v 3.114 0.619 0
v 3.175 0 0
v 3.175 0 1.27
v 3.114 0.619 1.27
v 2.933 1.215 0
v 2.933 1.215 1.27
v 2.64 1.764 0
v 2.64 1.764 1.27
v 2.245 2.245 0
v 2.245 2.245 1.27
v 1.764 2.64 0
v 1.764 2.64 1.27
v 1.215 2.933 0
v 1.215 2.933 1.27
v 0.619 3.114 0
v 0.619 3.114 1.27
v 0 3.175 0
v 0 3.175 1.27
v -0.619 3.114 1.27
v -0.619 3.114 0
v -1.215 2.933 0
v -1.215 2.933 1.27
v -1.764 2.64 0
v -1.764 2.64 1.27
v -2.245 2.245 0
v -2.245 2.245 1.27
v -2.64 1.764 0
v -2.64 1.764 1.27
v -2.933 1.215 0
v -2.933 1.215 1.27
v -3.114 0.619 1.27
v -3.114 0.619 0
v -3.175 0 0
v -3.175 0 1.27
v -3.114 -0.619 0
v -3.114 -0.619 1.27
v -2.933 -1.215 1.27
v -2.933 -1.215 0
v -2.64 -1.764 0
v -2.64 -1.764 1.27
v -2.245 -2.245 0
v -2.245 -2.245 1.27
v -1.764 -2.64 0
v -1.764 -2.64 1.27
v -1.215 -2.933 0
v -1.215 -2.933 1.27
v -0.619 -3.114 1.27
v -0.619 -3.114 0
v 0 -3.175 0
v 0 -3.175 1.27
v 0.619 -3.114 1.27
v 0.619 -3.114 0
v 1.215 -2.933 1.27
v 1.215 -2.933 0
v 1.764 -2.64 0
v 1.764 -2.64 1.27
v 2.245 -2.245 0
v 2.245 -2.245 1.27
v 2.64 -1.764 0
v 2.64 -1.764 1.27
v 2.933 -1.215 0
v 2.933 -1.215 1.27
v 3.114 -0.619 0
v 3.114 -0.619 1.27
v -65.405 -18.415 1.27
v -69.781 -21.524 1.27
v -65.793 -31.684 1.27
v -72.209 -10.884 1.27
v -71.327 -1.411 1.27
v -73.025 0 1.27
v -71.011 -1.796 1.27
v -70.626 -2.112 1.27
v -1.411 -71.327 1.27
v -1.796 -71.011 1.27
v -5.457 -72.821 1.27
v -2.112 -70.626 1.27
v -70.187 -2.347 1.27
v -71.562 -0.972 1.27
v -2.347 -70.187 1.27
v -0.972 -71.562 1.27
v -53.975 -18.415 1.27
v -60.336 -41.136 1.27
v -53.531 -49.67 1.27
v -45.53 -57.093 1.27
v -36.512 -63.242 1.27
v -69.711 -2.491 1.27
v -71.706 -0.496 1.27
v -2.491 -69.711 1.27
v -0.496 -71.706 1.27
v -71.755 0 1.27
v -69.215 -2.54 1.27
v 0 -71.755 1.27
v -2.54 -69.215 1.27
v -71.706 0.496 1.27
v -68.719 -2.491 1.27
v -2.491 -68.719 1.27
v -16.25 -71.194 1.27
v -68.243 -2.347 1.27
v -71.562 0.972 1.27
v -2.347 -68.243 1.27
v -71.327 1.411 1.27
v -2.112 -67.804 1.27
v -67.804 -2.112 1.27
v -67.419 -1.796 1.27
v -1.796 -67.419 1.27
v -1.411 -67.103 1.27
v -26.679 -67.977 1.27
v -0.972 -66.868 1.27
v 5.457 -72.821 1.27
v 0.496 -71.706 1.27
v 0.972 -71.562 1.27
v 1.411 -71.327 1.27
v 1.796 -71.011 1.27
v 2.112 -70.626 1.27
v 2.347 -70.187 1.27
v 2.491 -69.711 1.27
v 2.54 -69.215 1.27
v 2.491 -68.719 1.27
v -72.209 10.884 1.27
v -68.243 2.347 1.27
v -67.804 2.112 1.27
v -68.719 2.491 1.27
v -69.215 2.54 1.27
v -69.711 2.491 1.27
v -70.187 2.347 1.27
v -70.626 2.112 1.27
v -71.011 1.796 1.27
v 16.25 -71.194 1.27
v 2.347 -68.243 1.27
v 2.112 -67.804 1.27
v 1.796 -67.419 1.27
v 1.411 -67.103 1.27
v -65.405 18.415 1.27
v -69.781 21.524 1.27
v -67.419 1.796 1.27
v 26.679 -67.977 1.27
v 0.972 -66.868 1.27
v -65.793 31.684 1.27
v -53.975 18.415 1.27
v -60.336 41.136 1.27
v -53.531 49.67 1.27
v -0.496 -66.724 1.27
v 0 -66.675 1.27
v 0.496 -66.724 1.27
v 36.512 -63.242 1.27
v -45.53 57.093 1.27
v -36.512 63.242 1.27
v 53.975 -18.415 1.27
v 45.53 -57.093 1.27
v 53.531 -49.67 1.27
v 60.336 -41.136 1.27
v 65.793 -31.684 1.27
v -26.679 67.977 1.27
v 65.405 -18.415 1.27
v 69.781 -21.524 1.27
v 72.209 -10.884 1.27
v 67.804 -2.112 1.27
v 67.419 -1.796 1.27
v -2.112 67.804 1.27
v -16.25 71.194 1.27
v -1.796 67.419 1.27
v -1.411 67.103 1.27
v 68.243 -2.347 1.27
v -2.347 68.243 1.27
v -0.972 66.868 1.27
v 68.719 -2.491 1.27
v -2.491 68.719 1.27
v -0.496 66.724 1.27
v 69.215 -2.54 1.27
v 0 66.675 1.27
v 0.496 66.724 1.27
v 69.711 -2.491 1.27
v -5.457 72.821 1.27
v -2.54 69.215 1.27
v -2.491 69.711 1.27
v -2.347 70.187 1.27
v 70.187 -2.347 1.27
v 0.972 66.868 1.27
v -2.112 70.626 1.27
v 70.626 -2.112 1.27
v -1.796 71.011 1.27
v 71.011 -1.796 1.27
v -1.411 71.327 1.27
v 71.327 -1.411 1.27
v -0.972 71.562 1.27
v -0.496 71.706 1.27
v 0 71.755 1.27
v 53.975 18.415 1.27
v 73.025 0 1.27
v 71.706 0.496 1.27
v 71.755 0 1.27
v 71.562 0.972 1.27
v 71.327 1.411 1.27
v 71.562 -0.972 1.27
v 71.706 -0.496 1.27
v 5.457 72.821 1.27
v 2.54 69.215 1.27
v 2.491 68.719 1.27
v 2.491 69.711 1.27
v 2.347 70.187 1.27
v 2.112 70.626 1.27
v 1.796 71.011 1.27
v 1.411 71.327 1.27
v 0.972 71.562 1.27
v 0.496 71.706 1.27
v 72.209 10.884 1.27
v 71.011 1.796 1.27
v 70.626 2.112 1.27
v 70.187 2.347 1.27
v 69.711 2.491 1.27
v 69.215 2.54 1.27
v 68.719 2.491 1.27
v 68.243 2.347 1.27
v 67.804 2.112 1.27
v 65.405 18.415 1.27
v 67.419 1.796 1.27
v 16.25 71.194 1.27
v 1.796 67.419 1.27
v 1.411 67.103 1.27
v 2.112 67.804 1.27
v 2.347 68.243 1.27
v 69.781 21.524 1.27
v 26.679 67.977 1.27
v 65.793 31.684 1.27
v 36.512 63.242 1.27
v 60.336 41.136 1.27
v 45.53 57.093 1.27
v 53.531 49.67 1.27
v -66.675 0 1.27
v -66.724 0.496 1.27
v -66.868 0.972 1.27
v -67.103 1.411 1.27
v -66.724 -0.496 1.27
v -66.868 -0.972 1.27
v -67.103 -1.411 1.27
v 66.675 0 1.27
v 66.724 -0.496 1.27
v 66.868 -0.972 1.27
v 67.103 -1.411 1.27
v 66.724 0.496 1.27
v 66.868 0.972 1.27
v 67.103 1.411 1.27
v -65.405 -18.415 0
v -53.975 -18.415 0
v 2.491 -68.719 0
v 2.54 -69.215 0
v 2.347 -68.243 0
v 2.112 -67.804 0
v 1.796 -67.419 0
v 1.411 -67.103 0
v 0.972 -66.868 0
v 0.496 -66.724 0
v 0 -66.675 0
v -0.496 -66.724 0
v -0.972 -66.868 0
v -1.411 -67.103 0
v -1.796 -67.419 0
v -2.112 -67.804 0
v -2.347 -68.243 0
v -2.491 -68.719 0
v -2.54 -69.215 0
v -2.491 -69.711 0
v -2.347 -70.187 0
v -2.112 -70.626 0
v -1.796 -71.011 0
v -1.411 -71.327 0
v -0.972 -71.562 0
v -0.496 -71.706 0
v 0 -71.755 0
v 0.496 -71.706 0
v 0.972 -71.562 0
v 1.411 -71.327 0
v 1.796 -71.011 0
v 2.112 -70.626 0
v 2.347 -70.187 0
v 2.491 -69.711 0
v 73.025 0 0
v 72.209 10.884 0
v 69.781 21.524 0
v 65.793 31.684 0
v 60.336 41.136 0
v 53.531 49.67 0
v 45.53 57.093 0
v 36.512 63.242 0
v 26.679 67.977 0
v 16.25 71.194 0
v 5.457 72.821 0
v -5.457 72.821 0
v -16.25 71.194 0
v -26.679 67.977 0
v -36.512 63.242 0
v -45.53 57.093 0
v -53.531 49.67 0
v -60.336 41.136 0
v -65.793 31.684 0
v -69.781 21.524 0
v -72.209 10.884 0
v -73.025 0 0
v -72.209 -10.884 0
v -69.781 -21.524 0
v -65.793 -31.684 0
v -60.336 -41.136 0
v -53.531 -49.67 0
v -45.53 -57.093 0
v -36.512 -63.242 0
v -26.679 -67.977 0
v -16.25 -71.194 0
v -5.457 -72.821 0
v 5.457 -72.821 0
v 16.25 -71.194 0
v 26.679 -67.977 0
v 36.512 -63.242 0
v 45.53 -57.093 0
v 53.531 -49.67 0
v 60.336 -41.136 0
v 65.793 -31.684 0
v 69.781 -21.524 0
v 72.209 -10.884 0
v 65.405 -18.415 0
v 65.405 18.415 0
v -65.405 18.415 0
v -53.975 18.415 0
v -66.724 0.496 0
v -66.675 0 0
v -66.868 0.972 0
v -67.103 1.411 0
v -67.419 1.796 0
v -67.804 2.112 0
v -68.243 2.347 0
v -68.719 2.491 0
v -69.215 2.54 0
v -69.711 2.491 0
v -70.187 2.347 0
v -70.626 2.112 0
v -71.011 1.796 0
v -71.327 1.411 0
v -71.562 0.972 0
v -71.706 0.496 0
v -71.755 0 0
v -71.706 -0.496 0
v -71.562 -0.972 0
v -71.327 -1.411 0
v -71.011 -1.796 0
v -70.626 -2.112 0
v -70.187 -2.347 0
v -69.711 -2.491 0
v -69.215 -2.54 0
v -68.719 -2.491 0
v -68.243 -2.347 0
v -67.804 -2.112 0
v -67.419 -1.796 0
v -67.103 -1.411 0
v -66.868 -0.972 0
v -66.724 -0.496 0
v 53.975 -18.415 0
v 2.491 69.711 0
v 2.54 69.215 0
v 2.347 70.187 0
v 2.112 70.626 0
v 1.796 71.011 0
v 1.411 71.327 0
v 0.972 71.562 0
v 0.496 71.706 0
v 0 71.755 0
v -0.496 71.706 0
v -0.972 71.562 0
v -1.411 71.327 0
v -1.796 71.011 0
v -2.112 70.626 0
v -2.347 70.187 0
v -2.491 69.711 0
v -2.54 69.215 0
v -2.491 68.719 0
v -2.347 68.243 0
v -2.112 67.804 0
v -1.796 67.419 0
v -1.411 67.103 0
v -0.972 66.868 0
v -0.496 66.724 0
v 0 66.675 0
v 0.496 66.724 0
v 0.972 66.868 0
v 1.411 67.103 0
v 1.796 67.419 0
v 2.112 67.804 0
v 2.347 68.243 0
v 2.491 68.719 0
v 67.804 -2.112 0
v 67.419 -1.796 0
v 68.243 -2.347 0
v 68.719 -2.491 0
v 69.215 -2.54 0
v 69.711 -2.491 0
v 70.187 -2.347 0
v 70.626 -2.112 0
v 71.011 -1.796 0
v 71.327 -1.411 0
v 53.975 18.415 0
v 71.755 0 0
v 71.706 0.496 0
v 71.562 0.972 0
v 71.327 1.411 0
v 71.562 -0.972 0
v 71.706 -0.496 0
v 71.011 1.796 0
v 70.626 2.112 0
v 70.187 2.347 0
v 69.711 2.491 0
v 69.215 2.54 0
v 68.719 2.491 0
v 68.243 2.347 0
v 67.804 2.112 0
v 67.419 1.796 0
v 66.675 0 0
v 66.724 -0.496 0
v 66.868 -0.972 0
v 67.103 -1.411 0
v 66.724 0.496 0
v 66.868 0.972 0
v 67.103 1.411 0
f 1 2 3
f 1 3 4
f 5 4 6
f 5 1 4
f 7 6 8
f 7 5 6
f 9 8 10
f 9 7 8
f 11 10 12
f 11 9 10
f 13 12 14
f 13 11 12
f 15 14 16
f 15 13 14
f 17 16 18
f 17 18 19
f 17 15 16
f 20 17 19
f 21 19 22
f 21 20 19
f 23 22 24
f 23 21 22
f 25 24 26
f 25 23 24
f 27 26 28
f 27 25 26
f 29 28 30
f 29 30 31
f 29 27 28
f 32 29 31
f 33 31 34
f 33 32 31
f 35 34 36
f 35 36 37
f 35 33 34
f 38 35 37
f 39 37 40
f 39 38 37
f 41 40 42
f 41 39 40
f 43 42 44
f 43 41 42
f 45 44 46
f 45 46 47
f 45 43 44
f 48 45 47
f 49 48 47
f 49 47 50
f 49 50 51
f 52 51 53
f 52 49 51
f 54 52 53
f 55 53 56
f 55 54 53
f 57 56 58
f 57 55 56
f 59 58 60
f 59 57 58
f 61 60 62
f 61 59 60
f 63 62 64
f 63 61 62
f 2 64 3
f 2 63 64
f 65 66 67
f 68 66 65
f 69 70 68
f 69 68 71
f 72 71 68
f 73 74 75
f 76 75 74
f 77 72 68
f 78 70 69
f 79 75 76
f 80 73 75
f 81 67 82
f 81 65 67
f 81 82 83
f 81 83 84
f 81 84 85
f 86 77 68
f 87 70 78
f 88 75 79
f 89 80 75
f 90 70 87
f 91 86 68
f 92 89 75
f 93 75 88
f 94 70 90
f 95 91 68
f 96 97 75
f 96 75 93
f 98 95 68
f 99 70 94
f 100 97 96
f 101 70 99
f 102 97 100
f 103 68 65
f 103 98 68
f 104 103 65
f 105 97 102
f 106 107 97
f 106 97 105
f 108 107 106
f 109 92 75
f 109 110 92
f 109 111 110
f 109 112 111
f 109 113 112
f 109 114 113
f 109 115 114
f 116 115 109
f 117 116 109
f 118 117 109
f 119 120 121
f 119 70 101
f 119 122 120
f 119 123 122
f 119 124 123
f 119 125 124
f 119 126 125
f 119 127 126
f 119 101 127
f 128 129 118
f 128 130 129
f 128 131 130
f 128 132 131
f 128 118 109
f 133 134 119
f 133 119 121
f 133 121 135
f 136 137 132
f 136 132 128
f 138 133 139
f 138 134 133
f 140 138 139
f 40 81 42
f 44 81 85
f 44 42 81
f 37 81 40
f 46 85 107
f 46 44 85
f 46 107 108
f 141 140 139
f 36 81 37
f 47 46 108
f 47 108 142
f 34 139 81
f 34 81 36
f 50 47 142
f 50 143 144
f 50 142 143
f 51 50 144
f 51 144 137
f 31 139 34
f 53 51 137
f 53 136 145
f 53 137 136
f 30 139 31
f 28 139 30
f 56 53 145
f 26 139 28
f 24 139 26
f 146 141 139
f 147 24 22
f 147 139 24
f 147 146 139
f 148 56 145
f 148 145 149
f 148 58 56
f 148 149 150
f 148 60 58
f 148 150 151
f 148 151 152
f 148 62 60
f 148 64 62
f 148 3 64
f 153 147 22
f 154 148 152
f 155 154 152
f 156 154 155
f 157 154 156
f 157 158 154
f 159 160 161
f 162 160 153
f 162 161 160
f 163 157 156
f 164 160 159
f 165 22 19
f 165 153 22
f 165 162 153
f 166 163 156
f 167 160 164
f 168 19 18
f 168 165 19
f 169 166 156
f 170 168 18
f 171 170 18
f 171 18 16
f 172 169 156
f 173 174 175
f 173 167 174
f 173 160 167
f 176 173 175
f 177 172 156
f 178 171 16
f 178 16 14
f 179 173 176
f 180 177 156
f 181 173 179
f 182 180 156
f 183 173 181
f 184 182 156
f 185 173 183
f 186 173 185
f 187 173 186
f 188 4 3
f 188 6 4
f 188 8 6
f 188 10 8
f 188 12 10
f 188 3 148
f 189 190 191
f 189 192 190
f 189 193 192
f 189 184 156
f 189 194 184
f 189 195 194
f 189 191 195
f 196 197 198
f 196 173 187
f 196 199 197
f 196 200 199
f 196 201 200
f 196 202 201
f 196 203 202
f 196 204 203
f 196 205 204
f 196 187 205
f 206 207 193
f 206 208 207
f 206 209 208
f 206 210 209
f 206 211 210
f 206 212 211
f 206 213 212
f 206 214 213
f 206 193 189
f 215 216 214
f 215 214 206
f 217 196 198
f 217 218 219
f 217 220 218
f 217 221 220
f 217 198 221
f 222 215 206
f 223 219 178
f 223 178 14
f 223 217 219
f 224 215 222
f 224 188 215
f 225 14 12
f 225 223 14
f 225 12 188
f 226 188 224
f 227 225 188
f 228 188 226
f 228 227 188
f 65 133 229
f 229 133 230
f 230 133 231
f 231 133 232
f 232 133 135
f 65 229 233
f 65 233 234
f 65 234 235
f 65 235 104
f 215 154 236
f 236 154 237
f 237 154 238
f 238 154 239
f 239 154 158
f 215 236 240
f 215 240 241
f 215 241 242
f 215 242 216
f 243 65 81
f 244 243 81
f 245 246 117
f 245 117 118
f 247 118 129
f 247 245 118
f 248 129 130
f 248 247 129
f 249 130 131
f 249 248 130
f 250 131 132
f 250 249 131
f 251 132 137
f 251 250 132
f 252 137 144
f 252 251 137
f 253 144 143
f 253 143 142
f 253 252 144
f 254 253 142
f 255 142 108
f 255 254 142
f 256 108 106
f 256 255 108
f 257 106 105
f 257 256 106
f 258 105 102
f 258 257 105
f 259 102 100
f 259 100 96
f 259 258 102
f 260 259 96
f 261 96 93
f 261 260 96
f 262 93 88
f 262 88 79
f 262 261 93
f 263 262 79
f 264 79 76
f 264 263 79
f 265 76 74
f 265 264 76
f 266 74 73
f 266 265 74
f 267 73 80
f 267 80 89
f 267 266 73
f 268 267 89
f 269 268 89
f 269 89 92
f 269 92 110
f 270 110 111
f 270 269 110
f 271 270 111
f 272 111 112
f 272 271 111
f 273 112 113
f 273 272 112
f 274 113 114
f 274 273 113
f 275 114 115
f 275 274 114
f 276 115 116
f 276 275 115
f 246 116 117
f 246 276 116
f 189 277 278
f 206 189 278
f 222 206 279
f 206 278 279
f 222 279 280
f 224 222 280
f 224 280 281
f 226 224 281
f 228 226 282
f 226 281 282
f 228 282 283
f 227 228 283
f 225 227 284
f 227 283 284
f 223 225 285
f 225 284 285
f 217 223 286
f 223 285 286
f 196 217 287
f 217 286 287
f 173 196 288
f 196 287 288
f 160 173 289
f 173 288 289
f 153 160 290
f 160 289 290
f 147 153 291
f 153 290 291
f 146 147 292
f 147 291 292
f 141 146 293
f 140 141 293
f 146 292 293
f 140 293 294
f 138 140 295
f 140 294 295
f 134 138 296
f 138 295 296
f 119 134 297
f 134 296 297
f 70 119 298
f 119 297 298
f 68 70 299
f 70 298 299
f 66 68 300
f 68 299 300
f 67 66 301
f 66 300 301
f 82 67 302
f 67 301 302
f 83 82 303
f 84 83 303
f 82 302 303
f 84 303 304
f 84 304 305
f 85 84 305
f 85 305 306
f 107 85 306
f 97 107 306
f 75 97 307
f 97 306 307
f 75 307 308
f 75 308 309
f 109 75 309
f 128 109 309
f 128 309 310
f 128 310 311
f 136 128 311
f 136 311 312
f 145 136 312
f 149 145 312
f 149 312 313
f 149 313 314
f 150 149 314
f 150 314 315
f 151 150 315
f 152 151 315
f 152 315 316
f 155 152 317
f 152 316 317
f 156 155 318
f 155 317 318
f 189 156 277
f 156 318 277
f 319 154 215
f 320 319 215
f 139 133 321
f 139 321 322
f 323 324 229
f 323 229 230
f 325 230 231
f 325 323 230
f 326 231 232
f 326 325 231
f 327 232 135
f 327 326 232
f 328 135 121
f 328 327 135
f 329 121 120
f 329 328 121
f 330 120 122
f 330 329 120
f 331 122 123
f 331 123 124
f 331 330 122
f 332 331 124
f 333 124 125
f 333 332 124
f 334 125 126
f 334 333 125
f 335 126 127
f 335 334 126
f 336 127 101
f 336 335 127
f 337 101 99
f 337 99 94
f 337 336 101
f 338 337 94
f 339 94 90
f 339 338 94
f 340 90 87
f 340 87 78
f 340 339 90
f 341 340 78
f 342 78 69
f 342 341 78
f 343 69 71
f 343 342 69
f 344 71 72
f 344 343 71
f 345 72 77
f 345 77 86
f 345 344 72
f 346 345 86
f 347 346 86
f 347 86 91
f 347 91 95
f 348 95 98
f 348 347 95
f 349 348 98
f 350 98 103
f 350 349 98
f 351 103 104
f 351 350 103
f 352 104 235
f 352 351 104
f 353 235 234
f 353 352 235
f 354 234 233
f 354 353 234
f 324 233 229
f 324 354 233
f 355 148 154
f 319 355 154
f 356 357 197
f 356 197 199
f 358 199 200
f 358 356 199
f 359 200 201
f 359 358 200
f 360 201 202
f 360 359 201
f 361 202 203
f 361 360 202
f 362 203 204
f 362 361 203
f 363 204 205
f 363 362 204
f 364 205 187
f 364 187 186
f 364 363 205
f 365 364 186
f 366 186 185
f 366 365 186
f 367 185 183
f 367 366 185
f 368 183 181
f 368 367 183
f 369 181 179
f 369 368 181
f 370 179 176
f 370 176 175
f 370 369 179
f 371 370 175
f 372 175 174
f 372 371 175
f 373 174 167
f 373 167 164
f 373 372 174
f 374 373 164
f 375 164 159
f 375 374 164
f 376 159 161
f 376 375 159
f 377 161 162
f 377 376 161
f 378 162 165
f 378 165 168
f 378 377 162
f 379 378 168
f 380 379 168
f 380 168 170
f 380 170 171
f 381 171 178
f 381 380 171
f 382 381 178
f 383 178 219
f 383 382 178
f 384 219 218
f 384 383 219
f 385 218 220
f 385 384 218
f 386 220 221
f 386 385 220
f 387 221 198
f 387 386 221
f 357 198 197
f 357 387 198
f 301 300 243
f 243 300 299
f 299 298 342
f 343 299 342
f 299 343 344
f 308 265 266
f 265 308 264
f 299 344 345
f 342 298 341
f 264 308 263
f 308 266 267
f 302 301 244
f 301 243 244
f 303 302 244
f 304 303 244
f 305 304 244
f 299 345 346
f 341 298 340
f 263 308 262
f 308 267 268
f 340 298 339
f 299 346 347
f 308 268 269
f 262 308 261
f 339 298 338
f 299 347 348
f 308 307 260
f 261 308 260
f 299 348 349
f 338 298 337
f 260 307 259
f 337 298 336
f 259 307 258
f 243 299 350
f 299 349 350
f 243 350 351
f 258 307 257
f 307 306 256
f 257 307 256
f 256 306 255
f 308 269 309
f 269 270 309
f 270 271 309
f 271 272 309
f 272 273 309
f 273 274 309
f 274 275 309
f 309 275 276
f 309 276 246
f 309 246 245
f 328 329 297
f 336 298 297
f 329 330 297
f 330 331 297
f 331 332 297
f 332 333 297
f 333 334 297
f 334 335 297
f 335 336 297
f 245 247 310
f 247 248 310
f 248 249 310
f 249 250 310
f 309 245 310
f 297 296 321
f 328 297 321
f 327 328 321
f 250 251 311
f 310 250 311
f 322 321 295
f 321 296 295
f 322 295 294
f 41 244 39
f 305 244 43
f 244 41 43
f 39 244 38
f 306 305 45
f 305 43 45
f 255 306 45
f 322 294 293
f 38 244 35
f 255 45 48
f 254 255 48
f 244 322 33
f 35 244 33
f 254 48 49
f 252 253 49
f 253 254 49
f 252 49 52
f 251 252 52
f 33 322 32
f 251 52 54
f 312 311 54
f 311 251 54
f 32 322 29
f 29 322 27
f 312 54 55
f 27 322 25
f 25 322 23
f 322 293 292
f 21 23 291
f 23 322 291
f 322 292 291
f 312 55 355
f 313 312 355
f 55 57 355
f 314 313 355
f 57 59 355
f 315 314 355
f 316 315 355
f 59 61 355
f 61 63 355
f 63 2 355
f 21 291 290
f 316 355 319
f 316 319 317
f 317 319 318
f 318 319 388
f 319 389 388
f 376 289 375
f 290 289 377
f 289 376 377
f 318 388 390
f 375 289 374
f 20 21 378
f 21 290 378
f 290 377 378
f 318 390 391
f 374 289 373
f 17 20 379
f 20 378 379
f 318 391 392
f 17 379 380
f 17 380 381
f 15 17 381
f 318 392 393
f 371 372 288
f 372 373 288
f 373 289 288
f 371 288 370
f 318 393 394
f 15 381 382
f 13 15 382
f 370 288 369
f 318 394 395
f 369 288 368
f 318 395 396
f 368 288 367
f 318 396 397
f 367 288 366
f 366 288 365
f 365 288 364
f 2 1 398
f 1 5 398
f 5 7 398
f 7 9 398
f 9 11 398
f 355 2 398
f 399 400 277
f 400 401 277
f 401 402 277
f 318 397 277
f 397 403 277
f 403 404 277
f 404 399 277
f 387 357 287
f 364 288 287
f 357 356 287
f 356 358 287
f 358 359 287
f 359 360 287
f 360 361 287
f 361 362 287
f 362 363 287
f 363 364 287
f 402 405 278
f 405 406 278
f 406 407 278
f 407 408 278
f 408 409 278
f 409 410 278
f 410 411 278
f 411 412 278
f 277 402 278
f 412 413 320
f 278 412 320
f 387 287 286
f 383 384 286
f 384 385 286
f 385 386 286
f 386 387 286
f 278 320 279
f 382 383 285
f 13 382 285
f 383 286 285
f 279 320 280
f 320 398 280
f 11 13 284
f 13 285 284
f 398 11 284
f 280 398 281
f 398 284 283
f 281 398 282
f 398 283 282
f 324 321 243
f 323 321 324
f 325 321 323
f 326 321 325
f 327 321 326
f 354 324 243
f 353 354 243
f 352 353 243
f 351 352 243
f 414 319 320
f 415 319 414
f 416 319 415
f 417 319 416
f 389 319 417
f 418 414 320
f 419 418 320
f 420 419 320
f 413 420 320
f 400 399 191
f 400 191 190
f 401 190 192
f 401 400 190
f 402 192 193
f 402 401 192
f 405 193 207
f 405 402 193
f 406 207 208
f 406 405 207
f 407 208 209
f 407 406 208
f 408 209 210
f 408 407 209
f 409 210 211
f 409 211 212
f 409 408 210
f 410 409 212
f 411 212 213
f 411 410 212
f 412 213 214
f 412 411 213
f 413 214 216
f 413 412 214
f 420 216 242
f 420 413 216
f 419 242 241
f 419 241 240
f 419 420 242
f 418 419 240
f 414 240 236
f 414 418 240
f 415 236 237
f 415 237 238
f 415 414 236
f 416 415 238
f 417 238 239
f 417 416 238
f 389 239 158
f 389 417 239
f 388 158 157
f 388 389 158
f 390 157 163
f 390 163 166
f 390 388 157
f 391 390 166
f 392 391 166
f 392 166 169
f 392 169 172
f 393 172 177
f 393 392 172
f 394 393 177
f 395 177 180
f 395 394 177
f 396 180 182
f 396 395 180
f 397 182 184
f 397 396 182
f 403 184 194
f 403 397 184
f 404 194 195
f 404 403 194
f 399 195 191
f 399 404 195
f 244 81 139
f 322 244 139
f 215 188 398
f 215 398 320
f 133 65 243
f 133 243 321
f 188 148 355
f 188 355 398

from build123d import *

# Parameters (mm, degrees)
F0_R     = 73.025
F0_R_2   = 2.54
F0_R_3   = 3.175
F1_DEPTH = 1.27
F2_W     = 11.43
F2_H     = 36.83
F3_DEPTH = 1.271


with BuildPart() as f1:
    # F0 (on Top) → F1 (new body)
    with BuildSketch(Plane.XY):
        Circle(F0_R)
        with Locations((0, -69.215)):
            Circle(F0_R_2, mode=Mode.SUBTRACT)
        with Locations((-69.215, 0)):
            Circle(F0_R_2, mode=Mode.SUBTRACT)
        Circle(F0_R_3, mode=Mode.SUBTRACT)
        with Locations((69.215, 0)):
            Circle(F0_R_2, mode=Mode.SUBTRACT)
        with Locations((0, 69.215)):
            Circle(F0_R_2, mode=Mode.SUBTRACT)
    extrude(amount=F1_DEPTH)

    # F2 (on face) → F3 (cut, through all)
    with BuildSketch(Plane.XY.offset(1.27)):
        with Locations((-59.69, 0)):
            Rectangle(F2_W, F2_H)
        with Locations((59.69, 0)):
            Rectangle(F2_W, F2_H)
    extrude(amount=-F3_DEPTH, mode=Mode.SUBTRACT)


solid = f1.part
